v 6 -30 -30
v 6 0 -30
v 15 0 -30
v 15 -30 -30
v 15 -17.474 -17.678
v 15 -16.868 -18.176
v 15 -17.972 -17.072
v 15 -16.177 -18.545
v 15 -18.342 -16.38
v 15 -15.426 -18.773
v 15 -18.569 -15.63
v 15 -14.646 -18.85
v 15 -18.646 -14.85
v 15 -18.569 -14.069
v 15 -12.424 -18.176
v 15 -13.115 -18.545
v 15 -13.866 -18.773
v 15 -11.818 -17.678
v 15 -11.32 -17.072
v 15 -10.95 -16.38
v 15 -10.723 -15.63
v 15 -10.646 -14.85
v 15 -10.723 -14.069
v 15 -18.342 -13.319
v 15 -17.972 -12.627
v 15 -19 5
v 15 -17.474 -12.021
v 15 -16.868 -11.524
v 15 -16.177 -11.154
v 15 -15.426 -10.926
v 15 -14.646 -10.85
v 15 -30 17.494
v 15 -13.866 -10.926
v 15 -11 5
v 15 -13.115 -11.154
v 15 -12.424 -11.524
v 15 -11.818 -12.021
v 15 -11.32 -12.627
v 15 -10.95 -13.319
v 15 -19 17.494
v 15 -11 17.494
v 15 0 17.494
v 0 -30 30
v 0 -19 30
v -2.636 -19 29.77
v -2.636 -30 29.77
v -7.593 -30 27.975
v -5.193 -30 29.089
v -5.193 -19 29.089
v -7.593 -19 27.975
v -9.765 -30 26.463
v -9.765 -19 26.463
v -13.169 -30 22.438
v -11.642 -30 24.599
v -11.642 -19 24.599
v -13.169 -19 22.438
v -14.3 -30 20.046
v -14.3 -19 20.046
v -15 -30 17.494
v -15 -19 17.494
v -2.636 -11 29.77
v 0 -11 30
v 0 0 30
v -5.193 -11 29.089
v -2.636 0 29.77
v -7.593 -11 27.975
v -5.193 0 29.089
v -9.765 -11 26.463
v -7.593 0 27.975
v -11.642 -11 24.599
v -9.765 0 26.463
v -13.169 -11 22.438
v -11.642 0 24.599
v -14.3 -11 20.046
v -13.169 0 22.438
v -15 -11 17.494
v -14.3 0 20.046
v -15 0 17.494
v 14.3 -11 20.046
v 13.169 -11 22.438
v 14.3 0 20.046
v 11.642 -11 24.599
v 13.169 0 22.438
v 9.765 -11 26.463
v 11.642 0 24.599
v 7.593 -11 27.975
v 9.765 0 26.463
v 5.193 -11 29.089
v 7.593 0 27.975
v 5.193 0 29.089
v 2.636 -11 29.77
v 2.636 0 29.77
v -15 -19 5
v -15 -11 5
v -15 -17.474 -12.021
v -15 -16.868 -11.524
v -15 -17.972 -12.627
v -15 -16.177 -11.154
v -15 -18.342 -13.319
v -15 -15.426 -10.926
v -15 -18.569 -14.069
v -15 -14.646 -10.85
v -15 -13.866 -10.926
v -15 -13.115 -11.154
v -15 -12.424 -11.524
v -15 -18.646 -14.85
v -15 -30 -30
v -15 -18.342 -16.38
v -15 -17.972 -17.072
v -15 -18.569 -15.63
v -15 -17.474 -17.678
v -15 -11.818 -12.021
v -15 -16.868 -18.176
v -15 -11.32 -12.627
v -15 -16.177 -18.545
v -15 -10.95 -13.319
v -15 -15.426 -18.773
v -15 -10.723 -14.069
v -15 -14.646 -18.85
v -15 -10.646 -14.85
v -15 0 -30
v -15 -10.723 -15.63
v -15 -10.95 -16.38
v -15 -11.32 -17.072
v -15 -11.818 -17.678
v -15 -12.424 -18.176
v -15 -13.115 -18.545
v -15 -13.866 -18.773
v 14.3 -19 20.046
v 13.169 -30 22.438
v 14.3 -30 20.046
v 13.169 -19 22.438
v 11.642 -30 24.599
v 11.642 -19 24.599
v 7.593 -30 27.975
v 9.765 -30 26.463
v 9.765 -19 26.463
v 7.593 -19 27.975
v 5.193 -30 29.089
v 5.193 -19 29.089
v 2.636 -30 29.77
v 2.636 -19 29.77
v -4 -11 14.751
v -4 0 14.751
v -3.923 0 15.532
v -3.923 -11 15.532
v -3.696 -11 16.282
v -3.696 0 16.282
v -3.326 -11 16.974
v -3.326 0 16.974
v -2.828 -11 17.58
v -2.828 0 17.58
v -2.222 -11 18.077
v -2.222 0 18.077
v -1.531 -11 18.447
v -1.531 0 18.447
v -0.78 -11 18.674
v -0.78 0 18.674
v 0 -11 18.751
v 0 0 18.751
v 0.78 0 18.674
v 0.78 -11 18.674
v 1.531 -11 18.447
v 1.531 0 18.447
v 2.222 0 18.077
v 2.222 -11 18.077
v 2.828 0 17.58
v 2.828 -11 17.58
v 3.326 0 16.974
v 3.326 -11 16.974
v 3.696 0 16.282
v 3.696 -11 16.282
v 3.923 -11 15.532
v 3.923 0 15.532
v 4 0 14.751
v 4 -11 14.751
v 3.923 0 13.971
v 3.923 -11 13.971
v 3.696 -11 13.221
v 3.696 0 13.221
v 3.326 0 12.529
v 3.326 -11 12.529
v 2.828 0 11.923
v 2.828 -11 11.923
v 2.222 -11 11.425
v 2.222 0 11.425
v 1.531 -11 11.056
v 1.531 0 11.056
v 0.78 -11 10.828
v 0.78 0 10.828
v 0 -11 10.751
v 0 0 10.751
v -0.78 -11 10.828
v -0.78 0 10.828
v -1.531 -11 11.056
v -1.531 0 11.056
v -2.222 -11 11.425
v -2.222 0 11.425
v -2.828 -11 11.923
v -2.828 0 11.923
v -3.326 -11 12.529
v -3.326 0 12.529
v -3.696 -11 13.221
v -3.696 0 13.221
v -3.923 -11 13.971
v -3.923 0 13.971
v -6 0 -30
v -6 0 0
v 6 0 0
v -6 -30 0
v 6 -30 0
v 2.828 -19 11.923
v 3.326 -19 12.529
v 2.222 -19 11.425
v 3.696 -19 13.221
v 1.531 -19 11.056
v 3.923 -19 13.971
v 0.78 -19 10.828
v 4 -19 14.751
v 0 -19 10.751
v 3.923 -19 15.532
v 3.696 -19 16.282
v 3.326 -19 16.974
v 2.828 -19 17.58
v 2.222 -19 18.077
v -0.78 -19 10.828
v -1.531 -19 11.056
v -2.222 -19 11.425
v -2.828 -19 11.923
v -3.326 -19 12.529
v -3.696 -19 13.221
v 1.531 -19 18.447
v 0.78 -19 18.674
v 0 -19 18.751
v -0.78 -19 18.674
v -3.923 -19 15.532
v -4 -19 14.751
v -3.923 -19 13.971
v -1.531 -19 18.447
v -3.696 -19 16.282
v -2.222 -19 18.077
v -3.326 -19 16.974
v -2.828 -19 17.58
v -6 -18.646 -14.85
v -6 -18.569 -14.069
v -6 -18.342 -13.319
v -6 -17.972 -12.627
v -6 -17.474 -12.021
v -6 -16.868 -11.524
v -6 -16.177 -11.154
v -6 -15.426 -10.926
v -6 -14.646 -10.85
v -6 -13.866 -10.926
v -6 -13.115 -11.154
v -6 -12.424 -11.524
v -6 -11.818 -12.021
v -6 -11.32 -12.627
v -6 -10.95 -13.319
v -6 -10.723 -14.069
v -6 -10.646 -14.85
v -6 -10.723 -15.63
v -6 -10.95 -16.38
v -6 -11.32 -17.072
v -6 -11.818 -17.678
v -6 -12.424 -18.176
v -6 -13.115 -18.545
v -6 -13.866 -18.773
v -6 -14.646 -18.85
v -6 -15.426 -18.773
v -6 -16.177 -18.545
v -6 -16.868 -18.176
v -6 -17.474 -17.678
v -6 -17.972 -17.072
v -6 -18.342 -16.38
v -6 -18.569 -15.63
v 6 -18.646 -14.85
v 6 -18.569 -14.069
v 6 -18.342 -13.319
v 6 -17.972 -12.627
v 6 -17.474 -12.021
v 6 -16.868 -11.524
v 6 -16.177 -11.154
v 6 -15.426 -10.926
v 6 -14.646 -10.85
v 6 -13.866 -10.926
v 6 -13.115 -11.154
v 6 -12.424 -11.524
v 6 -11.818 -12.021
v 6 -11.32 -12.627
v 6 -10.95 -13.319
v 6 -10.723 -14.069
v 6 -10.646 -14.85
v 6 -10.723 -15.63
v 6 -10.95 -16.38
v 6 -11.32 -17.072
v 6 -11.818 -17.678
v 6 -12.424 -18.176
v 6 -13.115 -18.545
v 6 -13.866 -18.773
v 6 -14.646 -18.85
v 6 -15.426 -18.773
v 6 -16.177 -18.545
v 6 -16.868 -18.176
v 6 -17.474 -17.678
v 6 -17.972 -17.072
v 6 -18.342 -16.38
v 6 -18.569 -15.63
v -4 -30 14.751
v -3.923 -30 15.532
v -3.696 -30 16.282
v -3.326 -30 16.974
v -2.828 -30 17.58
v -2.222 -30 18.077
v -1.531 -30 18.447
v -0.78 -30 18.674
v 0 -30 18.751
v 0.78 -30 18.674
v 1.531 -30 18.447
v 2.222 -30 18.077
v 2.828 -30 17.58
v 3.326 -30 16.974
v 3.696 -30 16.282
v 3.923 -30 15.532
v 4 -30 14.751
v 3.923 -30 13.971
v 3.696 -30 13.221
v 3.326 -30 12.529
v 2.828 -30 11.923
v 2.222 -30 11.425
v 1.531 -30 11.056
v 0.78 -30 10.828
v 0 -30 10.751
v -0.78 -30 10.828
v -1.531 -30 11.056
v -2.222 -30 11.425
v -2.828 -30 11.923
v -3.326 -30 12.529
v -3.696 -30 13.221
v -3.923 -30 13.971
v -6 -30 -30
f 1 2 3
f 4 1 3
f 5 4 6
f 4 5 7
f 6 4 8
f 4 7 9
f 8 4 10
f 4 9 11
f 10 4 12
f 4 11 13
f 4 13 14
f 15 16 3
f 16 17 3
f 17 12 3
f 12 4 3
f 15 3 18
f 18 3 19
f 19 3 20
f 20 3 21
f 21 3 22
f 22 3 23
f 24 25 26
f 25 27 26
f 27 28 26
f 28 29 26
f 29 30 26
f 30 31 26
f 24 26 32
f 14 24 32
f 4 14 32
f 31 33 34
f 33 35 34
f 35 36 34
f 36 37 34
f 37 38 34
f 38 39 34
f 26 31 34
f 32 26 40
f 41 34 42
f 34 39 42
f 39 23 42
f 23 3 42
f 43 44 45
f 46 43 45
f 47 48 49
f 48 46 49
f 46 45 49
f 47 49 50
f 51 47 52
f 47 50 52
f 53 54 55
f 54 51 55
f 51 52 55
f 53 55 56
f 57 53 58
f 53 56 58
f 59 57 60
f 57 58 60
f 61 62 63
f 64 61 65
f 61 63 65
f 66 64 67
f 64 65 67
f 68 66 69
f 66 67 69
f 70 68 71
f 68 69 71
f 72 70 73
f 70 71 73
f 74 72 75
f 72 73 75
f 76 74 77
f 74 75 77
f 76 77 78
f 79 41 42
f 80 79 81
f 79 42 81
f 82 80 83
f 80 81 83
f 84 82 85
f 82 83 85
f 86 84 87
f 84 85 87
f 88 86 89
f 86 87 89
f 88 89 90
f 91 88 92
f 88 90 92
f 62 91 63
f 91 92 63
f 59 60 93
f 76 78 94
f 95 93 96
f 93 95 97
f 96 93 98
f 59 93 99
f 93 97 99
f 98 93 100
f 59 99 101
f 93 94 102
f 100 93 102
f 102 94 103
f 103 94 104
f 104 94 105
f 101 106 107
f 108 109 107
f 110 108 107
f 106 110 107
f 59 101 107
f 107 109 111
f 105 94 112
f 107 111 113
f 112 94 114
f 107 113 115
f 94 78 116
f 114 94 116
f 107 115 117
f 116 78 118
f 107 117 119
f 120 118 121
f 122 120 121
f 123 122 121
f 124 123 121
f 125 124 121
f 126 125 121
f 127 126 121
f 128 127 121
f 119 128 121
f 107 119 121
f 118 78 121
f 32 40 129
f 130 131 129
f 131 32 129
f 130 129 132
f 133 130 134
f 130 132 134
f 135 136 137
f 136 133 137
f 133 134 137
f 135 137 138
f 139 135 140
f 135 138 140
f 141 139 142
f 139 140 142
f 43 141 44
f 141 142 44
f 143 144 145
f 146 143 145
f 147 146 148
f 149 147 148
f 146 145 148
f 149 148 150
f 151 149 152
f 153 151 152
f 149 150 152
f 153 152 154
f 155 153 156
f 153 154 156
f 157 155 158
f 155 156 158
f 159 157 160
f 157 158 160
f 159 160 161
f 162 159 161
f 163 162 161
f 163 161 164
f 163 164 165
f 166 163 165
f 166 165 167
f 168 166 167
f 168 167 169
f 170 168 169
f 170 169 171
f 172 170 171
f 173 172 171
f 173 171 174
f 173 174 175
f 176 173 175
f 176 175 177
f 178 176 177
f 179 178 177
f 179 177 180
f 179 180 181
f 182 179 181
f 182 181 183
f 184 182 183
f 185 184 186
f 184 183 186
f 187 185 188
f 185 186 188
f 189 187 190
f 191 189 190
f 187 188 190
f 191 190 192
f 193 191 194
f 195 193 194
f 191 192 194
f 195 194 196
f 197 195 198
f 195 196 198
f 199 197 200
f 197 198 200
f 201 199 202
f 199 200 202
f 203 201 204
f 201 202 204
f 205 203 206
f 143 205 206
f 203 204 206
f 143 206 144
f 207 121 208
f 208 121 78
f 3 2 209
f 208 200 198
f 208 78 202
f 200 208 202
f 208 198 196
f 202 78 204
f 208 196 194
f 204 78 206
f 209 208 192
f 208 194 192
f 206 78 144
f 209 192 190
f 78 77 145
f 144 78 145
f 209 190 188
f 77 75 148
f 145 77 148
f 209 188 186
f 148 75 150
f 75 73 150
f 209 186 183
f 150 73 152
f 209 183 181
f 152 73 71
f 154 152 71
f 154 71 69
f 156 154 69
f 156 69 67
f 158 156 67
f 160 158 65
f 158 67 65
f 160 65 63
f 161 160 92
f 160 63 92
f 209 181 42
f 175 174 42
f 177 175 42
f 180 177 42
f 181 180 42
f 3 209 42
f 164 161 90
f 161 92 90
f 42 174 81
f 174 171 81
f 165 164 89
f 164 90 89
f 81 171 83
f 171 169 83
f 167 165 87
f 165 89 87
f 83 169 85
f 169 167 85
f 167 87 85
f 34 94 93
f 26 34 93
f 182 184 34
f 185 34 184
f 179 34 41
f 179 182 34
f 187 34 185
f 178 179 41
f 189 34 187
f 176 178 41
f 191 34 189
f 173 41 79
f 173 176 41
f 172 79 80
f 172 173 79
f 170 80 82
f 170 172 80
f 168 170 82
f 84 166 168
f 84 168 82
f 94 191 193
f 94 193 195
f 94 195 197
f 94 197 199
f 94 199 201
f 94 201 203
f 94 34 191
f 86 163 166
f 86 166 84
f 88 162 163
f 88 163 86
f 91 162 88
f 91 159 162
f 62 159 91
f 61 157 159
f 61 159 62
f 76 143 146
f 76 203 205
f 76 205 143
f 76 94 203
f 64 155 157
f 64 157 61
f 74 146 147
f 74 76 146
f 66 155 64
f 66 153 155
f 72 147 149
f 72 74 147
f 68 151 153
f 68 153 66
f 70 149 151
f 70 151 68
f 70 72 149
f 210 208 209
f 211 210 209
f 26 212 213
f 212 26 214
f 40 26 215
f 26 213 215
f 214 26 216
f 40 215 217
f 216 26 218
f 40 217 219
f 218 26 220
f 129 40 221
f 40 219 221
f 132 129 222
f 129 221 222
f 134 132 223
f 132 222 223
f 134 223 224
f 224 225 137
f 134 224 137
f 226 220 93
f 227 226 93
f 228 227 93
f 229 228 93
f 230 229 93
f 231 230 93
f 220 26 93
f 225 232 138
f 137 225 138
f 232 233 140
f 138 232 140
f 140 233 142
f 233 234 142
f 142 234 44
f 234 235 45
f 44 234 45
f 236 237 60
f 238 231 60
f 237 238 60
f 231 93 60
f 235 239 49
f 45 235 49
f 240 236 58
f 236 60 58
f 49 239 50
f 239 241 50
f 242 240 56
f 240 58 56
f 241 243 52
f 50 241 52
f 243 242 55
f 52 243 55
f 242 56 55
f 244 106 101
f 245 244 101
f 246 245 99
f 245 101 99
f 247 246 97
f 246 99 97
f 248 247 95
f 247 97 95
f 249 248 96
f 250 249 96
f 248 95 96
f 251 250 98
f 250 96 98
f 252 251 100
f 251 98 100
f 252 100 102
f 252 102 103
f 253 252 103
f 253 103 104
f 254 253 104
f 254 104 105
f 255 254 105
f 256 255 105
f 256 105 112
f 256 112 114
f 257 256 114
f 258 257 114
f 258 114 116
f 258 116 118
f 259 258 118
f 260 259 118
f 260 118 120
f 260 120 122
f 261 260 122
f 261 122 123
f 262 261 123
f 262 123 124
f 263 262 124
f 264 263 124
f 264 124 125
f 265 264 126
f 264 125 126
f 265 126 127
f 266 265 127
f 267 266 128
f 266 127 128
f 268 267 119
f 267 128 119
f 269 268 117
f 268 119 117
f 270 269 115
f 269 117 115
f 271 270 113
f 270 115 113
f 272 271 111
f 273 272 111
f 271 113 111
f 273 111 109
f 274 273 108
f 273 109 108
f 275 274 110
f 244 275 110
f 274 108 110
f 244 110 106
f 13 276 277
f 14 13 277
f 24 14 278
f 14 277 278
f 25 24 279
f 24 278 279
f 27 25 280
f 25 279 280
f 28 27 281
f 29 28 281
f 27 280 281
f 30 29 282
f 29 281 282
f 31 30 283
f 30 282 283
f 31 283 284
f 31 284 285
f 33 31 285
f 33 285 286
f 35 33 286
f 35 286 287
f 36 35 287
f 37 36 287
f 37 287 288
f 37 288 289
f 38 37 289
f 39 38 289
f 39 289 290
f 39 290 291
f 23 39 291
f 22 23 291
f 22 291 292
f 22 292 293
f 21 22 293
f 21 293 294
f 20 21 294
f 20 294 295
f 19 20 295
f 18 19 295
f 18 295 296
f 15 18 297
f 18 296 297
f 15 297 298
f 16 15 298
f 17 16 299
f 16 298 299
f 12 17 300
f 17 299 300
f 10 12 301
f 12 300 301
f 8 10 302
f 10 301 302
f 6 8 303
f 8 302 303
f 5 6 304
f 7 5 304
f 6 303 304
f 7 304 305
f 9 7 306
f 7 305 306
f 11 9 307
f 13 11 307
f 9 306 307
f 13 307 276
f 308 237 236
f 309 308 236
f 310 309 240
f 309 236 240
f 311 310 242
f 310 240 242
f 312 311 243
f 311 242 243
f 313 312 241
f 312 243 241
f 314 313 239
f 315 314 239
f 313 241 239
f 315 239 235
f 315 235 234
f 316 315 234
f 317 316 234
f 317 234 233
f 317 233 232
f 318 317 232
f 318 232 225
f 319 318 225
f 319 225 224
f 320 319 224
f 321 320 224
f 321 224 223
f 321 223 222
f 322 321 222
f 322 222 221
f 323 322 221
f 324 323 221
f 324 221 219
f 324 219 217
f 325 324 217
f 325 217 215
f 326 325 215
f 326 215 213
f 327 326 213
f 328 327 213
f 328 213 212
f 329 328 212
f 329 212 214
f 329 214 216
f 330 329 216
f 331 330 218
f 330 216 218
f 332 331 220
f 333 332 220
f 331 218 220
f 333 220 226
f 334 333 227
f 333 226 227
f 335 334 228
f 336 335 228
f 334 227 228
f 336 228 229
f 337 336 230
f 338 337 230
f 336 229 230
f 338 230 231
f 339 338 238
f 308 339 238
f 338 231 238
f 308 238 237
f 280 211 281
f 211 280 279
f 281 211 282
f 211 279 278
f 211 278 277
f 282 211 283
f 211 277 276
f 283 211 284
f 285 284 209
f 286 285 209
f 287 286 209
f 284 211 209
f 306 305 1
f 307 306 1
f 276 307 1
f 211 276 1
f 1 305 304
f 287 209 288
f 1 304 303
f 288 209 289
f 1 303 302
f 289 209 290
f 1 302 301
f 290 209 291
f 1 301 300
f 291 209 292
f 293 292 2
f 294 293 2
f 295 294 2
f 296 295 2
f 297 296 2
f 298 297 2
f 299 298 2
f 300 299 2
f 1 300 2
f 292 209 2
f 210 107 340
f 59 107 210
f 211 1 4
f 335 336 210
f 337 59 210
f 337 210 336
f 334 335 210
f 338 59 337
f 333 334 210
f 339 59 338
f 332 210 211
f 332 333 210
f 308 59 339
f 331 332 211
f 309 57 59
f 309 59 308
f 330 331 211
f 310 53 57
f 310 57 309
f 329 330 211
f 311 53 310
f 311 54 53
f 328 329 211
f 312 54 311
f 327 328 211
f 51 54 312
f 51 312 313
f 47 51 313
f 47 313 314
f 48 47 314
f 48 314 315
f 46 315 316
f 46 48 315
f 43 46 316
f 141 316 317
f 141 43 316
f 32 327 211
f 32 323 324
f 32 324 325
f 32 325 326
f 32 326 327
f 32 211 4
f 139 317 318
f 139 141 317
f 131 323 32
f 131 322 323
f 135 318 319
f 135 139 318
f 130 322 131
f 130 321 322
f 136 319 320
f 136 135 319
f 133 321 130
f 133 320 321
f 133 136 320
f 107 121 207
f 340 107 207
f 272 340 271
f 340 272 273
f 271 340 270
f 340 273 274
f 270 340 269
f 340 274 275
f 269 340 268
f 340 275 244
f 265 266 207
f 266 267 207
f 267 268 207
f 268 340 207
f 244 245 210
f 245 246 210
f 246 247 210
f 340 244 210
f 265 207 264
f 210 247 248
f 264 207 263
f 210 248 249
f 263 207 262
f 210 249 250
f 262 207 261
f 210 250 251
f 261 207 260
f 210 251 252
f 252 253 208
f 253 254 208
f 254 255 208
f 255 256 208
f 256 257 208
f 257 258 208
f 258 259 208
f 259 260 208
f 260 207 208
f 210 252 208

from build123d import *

# Parameters (mm, degrees)
F1_DEPTH = 30
F2_R     = 4
F2_W     = 8
F2_H     = 50
F3_DEPTH = 30.001
F4_R     = 4
F5_DEPTH = 30.001
F7_DEPTH = 30.001


with BuildPart() as f1:
    # F0 (on Front) → F1 (new body)
    with BuildSketch(Plane.XZ):
        Polygon((15, 30), (-15, 30), (-15, -30), (-6, -30), (-6, 0), (6, 0), (6, -30), (15, -30), align=None)
    extrude(amount=F1_DEPTH)

    # F2 (on face) → F3 (cut, through all)
    with BuildSketch(Plane(origin=(-15, 0, 0), x_dir=(0, -1, 0), z_dir=(-1, 0, 0))):
        with Locations((14.645997, -14.849633)):
            Circle(F2_R)
        with Locations((15, 30)):
            Rectangle(F2_W, F2_H)
    extrude(amount=-F3_DEPTH, mode=Mode.SUBTRACT)

    # F4 (on face) → F5 (cut, through all)
    with BuildSketch(Plane(origin=(0, 0, 0), x_dir=(-1, 0, 0), z_dir=(0, 1, 0))):
        with Locations((0, 14.751268)):
            Circle(F4_R)
    extrude(amount=-F5_DEPTH, mode=Mode.SUBTRACT)

    # F6 (on face) → F7 (cut, through all)
    with BuildSketch(Plane(origin=(0, 0, 0), x_dir=(-1, 0, 0), z_dir=(0, 1, 0))):
        with BuildLine():
            ThreePointArc((0, 30), (9.76466, 26.463451), (15, 17.494227))
            Line((15, 17.494227), (15, 30))
            Line((15, 30), (0, 30))
        make_face()
        with BuildLine():
            ThreePointArc((-15, 17.494227), (-9.76466, 26.463451), (0, 30))
            Line((0, 30), (-15, 30))
            Line((-15, 30), (-15, 17.494227))
        make_face()
    extrude(amount=-F7_DEPTH, mode=Mode.SUBTRACT)


solid = f1.part
